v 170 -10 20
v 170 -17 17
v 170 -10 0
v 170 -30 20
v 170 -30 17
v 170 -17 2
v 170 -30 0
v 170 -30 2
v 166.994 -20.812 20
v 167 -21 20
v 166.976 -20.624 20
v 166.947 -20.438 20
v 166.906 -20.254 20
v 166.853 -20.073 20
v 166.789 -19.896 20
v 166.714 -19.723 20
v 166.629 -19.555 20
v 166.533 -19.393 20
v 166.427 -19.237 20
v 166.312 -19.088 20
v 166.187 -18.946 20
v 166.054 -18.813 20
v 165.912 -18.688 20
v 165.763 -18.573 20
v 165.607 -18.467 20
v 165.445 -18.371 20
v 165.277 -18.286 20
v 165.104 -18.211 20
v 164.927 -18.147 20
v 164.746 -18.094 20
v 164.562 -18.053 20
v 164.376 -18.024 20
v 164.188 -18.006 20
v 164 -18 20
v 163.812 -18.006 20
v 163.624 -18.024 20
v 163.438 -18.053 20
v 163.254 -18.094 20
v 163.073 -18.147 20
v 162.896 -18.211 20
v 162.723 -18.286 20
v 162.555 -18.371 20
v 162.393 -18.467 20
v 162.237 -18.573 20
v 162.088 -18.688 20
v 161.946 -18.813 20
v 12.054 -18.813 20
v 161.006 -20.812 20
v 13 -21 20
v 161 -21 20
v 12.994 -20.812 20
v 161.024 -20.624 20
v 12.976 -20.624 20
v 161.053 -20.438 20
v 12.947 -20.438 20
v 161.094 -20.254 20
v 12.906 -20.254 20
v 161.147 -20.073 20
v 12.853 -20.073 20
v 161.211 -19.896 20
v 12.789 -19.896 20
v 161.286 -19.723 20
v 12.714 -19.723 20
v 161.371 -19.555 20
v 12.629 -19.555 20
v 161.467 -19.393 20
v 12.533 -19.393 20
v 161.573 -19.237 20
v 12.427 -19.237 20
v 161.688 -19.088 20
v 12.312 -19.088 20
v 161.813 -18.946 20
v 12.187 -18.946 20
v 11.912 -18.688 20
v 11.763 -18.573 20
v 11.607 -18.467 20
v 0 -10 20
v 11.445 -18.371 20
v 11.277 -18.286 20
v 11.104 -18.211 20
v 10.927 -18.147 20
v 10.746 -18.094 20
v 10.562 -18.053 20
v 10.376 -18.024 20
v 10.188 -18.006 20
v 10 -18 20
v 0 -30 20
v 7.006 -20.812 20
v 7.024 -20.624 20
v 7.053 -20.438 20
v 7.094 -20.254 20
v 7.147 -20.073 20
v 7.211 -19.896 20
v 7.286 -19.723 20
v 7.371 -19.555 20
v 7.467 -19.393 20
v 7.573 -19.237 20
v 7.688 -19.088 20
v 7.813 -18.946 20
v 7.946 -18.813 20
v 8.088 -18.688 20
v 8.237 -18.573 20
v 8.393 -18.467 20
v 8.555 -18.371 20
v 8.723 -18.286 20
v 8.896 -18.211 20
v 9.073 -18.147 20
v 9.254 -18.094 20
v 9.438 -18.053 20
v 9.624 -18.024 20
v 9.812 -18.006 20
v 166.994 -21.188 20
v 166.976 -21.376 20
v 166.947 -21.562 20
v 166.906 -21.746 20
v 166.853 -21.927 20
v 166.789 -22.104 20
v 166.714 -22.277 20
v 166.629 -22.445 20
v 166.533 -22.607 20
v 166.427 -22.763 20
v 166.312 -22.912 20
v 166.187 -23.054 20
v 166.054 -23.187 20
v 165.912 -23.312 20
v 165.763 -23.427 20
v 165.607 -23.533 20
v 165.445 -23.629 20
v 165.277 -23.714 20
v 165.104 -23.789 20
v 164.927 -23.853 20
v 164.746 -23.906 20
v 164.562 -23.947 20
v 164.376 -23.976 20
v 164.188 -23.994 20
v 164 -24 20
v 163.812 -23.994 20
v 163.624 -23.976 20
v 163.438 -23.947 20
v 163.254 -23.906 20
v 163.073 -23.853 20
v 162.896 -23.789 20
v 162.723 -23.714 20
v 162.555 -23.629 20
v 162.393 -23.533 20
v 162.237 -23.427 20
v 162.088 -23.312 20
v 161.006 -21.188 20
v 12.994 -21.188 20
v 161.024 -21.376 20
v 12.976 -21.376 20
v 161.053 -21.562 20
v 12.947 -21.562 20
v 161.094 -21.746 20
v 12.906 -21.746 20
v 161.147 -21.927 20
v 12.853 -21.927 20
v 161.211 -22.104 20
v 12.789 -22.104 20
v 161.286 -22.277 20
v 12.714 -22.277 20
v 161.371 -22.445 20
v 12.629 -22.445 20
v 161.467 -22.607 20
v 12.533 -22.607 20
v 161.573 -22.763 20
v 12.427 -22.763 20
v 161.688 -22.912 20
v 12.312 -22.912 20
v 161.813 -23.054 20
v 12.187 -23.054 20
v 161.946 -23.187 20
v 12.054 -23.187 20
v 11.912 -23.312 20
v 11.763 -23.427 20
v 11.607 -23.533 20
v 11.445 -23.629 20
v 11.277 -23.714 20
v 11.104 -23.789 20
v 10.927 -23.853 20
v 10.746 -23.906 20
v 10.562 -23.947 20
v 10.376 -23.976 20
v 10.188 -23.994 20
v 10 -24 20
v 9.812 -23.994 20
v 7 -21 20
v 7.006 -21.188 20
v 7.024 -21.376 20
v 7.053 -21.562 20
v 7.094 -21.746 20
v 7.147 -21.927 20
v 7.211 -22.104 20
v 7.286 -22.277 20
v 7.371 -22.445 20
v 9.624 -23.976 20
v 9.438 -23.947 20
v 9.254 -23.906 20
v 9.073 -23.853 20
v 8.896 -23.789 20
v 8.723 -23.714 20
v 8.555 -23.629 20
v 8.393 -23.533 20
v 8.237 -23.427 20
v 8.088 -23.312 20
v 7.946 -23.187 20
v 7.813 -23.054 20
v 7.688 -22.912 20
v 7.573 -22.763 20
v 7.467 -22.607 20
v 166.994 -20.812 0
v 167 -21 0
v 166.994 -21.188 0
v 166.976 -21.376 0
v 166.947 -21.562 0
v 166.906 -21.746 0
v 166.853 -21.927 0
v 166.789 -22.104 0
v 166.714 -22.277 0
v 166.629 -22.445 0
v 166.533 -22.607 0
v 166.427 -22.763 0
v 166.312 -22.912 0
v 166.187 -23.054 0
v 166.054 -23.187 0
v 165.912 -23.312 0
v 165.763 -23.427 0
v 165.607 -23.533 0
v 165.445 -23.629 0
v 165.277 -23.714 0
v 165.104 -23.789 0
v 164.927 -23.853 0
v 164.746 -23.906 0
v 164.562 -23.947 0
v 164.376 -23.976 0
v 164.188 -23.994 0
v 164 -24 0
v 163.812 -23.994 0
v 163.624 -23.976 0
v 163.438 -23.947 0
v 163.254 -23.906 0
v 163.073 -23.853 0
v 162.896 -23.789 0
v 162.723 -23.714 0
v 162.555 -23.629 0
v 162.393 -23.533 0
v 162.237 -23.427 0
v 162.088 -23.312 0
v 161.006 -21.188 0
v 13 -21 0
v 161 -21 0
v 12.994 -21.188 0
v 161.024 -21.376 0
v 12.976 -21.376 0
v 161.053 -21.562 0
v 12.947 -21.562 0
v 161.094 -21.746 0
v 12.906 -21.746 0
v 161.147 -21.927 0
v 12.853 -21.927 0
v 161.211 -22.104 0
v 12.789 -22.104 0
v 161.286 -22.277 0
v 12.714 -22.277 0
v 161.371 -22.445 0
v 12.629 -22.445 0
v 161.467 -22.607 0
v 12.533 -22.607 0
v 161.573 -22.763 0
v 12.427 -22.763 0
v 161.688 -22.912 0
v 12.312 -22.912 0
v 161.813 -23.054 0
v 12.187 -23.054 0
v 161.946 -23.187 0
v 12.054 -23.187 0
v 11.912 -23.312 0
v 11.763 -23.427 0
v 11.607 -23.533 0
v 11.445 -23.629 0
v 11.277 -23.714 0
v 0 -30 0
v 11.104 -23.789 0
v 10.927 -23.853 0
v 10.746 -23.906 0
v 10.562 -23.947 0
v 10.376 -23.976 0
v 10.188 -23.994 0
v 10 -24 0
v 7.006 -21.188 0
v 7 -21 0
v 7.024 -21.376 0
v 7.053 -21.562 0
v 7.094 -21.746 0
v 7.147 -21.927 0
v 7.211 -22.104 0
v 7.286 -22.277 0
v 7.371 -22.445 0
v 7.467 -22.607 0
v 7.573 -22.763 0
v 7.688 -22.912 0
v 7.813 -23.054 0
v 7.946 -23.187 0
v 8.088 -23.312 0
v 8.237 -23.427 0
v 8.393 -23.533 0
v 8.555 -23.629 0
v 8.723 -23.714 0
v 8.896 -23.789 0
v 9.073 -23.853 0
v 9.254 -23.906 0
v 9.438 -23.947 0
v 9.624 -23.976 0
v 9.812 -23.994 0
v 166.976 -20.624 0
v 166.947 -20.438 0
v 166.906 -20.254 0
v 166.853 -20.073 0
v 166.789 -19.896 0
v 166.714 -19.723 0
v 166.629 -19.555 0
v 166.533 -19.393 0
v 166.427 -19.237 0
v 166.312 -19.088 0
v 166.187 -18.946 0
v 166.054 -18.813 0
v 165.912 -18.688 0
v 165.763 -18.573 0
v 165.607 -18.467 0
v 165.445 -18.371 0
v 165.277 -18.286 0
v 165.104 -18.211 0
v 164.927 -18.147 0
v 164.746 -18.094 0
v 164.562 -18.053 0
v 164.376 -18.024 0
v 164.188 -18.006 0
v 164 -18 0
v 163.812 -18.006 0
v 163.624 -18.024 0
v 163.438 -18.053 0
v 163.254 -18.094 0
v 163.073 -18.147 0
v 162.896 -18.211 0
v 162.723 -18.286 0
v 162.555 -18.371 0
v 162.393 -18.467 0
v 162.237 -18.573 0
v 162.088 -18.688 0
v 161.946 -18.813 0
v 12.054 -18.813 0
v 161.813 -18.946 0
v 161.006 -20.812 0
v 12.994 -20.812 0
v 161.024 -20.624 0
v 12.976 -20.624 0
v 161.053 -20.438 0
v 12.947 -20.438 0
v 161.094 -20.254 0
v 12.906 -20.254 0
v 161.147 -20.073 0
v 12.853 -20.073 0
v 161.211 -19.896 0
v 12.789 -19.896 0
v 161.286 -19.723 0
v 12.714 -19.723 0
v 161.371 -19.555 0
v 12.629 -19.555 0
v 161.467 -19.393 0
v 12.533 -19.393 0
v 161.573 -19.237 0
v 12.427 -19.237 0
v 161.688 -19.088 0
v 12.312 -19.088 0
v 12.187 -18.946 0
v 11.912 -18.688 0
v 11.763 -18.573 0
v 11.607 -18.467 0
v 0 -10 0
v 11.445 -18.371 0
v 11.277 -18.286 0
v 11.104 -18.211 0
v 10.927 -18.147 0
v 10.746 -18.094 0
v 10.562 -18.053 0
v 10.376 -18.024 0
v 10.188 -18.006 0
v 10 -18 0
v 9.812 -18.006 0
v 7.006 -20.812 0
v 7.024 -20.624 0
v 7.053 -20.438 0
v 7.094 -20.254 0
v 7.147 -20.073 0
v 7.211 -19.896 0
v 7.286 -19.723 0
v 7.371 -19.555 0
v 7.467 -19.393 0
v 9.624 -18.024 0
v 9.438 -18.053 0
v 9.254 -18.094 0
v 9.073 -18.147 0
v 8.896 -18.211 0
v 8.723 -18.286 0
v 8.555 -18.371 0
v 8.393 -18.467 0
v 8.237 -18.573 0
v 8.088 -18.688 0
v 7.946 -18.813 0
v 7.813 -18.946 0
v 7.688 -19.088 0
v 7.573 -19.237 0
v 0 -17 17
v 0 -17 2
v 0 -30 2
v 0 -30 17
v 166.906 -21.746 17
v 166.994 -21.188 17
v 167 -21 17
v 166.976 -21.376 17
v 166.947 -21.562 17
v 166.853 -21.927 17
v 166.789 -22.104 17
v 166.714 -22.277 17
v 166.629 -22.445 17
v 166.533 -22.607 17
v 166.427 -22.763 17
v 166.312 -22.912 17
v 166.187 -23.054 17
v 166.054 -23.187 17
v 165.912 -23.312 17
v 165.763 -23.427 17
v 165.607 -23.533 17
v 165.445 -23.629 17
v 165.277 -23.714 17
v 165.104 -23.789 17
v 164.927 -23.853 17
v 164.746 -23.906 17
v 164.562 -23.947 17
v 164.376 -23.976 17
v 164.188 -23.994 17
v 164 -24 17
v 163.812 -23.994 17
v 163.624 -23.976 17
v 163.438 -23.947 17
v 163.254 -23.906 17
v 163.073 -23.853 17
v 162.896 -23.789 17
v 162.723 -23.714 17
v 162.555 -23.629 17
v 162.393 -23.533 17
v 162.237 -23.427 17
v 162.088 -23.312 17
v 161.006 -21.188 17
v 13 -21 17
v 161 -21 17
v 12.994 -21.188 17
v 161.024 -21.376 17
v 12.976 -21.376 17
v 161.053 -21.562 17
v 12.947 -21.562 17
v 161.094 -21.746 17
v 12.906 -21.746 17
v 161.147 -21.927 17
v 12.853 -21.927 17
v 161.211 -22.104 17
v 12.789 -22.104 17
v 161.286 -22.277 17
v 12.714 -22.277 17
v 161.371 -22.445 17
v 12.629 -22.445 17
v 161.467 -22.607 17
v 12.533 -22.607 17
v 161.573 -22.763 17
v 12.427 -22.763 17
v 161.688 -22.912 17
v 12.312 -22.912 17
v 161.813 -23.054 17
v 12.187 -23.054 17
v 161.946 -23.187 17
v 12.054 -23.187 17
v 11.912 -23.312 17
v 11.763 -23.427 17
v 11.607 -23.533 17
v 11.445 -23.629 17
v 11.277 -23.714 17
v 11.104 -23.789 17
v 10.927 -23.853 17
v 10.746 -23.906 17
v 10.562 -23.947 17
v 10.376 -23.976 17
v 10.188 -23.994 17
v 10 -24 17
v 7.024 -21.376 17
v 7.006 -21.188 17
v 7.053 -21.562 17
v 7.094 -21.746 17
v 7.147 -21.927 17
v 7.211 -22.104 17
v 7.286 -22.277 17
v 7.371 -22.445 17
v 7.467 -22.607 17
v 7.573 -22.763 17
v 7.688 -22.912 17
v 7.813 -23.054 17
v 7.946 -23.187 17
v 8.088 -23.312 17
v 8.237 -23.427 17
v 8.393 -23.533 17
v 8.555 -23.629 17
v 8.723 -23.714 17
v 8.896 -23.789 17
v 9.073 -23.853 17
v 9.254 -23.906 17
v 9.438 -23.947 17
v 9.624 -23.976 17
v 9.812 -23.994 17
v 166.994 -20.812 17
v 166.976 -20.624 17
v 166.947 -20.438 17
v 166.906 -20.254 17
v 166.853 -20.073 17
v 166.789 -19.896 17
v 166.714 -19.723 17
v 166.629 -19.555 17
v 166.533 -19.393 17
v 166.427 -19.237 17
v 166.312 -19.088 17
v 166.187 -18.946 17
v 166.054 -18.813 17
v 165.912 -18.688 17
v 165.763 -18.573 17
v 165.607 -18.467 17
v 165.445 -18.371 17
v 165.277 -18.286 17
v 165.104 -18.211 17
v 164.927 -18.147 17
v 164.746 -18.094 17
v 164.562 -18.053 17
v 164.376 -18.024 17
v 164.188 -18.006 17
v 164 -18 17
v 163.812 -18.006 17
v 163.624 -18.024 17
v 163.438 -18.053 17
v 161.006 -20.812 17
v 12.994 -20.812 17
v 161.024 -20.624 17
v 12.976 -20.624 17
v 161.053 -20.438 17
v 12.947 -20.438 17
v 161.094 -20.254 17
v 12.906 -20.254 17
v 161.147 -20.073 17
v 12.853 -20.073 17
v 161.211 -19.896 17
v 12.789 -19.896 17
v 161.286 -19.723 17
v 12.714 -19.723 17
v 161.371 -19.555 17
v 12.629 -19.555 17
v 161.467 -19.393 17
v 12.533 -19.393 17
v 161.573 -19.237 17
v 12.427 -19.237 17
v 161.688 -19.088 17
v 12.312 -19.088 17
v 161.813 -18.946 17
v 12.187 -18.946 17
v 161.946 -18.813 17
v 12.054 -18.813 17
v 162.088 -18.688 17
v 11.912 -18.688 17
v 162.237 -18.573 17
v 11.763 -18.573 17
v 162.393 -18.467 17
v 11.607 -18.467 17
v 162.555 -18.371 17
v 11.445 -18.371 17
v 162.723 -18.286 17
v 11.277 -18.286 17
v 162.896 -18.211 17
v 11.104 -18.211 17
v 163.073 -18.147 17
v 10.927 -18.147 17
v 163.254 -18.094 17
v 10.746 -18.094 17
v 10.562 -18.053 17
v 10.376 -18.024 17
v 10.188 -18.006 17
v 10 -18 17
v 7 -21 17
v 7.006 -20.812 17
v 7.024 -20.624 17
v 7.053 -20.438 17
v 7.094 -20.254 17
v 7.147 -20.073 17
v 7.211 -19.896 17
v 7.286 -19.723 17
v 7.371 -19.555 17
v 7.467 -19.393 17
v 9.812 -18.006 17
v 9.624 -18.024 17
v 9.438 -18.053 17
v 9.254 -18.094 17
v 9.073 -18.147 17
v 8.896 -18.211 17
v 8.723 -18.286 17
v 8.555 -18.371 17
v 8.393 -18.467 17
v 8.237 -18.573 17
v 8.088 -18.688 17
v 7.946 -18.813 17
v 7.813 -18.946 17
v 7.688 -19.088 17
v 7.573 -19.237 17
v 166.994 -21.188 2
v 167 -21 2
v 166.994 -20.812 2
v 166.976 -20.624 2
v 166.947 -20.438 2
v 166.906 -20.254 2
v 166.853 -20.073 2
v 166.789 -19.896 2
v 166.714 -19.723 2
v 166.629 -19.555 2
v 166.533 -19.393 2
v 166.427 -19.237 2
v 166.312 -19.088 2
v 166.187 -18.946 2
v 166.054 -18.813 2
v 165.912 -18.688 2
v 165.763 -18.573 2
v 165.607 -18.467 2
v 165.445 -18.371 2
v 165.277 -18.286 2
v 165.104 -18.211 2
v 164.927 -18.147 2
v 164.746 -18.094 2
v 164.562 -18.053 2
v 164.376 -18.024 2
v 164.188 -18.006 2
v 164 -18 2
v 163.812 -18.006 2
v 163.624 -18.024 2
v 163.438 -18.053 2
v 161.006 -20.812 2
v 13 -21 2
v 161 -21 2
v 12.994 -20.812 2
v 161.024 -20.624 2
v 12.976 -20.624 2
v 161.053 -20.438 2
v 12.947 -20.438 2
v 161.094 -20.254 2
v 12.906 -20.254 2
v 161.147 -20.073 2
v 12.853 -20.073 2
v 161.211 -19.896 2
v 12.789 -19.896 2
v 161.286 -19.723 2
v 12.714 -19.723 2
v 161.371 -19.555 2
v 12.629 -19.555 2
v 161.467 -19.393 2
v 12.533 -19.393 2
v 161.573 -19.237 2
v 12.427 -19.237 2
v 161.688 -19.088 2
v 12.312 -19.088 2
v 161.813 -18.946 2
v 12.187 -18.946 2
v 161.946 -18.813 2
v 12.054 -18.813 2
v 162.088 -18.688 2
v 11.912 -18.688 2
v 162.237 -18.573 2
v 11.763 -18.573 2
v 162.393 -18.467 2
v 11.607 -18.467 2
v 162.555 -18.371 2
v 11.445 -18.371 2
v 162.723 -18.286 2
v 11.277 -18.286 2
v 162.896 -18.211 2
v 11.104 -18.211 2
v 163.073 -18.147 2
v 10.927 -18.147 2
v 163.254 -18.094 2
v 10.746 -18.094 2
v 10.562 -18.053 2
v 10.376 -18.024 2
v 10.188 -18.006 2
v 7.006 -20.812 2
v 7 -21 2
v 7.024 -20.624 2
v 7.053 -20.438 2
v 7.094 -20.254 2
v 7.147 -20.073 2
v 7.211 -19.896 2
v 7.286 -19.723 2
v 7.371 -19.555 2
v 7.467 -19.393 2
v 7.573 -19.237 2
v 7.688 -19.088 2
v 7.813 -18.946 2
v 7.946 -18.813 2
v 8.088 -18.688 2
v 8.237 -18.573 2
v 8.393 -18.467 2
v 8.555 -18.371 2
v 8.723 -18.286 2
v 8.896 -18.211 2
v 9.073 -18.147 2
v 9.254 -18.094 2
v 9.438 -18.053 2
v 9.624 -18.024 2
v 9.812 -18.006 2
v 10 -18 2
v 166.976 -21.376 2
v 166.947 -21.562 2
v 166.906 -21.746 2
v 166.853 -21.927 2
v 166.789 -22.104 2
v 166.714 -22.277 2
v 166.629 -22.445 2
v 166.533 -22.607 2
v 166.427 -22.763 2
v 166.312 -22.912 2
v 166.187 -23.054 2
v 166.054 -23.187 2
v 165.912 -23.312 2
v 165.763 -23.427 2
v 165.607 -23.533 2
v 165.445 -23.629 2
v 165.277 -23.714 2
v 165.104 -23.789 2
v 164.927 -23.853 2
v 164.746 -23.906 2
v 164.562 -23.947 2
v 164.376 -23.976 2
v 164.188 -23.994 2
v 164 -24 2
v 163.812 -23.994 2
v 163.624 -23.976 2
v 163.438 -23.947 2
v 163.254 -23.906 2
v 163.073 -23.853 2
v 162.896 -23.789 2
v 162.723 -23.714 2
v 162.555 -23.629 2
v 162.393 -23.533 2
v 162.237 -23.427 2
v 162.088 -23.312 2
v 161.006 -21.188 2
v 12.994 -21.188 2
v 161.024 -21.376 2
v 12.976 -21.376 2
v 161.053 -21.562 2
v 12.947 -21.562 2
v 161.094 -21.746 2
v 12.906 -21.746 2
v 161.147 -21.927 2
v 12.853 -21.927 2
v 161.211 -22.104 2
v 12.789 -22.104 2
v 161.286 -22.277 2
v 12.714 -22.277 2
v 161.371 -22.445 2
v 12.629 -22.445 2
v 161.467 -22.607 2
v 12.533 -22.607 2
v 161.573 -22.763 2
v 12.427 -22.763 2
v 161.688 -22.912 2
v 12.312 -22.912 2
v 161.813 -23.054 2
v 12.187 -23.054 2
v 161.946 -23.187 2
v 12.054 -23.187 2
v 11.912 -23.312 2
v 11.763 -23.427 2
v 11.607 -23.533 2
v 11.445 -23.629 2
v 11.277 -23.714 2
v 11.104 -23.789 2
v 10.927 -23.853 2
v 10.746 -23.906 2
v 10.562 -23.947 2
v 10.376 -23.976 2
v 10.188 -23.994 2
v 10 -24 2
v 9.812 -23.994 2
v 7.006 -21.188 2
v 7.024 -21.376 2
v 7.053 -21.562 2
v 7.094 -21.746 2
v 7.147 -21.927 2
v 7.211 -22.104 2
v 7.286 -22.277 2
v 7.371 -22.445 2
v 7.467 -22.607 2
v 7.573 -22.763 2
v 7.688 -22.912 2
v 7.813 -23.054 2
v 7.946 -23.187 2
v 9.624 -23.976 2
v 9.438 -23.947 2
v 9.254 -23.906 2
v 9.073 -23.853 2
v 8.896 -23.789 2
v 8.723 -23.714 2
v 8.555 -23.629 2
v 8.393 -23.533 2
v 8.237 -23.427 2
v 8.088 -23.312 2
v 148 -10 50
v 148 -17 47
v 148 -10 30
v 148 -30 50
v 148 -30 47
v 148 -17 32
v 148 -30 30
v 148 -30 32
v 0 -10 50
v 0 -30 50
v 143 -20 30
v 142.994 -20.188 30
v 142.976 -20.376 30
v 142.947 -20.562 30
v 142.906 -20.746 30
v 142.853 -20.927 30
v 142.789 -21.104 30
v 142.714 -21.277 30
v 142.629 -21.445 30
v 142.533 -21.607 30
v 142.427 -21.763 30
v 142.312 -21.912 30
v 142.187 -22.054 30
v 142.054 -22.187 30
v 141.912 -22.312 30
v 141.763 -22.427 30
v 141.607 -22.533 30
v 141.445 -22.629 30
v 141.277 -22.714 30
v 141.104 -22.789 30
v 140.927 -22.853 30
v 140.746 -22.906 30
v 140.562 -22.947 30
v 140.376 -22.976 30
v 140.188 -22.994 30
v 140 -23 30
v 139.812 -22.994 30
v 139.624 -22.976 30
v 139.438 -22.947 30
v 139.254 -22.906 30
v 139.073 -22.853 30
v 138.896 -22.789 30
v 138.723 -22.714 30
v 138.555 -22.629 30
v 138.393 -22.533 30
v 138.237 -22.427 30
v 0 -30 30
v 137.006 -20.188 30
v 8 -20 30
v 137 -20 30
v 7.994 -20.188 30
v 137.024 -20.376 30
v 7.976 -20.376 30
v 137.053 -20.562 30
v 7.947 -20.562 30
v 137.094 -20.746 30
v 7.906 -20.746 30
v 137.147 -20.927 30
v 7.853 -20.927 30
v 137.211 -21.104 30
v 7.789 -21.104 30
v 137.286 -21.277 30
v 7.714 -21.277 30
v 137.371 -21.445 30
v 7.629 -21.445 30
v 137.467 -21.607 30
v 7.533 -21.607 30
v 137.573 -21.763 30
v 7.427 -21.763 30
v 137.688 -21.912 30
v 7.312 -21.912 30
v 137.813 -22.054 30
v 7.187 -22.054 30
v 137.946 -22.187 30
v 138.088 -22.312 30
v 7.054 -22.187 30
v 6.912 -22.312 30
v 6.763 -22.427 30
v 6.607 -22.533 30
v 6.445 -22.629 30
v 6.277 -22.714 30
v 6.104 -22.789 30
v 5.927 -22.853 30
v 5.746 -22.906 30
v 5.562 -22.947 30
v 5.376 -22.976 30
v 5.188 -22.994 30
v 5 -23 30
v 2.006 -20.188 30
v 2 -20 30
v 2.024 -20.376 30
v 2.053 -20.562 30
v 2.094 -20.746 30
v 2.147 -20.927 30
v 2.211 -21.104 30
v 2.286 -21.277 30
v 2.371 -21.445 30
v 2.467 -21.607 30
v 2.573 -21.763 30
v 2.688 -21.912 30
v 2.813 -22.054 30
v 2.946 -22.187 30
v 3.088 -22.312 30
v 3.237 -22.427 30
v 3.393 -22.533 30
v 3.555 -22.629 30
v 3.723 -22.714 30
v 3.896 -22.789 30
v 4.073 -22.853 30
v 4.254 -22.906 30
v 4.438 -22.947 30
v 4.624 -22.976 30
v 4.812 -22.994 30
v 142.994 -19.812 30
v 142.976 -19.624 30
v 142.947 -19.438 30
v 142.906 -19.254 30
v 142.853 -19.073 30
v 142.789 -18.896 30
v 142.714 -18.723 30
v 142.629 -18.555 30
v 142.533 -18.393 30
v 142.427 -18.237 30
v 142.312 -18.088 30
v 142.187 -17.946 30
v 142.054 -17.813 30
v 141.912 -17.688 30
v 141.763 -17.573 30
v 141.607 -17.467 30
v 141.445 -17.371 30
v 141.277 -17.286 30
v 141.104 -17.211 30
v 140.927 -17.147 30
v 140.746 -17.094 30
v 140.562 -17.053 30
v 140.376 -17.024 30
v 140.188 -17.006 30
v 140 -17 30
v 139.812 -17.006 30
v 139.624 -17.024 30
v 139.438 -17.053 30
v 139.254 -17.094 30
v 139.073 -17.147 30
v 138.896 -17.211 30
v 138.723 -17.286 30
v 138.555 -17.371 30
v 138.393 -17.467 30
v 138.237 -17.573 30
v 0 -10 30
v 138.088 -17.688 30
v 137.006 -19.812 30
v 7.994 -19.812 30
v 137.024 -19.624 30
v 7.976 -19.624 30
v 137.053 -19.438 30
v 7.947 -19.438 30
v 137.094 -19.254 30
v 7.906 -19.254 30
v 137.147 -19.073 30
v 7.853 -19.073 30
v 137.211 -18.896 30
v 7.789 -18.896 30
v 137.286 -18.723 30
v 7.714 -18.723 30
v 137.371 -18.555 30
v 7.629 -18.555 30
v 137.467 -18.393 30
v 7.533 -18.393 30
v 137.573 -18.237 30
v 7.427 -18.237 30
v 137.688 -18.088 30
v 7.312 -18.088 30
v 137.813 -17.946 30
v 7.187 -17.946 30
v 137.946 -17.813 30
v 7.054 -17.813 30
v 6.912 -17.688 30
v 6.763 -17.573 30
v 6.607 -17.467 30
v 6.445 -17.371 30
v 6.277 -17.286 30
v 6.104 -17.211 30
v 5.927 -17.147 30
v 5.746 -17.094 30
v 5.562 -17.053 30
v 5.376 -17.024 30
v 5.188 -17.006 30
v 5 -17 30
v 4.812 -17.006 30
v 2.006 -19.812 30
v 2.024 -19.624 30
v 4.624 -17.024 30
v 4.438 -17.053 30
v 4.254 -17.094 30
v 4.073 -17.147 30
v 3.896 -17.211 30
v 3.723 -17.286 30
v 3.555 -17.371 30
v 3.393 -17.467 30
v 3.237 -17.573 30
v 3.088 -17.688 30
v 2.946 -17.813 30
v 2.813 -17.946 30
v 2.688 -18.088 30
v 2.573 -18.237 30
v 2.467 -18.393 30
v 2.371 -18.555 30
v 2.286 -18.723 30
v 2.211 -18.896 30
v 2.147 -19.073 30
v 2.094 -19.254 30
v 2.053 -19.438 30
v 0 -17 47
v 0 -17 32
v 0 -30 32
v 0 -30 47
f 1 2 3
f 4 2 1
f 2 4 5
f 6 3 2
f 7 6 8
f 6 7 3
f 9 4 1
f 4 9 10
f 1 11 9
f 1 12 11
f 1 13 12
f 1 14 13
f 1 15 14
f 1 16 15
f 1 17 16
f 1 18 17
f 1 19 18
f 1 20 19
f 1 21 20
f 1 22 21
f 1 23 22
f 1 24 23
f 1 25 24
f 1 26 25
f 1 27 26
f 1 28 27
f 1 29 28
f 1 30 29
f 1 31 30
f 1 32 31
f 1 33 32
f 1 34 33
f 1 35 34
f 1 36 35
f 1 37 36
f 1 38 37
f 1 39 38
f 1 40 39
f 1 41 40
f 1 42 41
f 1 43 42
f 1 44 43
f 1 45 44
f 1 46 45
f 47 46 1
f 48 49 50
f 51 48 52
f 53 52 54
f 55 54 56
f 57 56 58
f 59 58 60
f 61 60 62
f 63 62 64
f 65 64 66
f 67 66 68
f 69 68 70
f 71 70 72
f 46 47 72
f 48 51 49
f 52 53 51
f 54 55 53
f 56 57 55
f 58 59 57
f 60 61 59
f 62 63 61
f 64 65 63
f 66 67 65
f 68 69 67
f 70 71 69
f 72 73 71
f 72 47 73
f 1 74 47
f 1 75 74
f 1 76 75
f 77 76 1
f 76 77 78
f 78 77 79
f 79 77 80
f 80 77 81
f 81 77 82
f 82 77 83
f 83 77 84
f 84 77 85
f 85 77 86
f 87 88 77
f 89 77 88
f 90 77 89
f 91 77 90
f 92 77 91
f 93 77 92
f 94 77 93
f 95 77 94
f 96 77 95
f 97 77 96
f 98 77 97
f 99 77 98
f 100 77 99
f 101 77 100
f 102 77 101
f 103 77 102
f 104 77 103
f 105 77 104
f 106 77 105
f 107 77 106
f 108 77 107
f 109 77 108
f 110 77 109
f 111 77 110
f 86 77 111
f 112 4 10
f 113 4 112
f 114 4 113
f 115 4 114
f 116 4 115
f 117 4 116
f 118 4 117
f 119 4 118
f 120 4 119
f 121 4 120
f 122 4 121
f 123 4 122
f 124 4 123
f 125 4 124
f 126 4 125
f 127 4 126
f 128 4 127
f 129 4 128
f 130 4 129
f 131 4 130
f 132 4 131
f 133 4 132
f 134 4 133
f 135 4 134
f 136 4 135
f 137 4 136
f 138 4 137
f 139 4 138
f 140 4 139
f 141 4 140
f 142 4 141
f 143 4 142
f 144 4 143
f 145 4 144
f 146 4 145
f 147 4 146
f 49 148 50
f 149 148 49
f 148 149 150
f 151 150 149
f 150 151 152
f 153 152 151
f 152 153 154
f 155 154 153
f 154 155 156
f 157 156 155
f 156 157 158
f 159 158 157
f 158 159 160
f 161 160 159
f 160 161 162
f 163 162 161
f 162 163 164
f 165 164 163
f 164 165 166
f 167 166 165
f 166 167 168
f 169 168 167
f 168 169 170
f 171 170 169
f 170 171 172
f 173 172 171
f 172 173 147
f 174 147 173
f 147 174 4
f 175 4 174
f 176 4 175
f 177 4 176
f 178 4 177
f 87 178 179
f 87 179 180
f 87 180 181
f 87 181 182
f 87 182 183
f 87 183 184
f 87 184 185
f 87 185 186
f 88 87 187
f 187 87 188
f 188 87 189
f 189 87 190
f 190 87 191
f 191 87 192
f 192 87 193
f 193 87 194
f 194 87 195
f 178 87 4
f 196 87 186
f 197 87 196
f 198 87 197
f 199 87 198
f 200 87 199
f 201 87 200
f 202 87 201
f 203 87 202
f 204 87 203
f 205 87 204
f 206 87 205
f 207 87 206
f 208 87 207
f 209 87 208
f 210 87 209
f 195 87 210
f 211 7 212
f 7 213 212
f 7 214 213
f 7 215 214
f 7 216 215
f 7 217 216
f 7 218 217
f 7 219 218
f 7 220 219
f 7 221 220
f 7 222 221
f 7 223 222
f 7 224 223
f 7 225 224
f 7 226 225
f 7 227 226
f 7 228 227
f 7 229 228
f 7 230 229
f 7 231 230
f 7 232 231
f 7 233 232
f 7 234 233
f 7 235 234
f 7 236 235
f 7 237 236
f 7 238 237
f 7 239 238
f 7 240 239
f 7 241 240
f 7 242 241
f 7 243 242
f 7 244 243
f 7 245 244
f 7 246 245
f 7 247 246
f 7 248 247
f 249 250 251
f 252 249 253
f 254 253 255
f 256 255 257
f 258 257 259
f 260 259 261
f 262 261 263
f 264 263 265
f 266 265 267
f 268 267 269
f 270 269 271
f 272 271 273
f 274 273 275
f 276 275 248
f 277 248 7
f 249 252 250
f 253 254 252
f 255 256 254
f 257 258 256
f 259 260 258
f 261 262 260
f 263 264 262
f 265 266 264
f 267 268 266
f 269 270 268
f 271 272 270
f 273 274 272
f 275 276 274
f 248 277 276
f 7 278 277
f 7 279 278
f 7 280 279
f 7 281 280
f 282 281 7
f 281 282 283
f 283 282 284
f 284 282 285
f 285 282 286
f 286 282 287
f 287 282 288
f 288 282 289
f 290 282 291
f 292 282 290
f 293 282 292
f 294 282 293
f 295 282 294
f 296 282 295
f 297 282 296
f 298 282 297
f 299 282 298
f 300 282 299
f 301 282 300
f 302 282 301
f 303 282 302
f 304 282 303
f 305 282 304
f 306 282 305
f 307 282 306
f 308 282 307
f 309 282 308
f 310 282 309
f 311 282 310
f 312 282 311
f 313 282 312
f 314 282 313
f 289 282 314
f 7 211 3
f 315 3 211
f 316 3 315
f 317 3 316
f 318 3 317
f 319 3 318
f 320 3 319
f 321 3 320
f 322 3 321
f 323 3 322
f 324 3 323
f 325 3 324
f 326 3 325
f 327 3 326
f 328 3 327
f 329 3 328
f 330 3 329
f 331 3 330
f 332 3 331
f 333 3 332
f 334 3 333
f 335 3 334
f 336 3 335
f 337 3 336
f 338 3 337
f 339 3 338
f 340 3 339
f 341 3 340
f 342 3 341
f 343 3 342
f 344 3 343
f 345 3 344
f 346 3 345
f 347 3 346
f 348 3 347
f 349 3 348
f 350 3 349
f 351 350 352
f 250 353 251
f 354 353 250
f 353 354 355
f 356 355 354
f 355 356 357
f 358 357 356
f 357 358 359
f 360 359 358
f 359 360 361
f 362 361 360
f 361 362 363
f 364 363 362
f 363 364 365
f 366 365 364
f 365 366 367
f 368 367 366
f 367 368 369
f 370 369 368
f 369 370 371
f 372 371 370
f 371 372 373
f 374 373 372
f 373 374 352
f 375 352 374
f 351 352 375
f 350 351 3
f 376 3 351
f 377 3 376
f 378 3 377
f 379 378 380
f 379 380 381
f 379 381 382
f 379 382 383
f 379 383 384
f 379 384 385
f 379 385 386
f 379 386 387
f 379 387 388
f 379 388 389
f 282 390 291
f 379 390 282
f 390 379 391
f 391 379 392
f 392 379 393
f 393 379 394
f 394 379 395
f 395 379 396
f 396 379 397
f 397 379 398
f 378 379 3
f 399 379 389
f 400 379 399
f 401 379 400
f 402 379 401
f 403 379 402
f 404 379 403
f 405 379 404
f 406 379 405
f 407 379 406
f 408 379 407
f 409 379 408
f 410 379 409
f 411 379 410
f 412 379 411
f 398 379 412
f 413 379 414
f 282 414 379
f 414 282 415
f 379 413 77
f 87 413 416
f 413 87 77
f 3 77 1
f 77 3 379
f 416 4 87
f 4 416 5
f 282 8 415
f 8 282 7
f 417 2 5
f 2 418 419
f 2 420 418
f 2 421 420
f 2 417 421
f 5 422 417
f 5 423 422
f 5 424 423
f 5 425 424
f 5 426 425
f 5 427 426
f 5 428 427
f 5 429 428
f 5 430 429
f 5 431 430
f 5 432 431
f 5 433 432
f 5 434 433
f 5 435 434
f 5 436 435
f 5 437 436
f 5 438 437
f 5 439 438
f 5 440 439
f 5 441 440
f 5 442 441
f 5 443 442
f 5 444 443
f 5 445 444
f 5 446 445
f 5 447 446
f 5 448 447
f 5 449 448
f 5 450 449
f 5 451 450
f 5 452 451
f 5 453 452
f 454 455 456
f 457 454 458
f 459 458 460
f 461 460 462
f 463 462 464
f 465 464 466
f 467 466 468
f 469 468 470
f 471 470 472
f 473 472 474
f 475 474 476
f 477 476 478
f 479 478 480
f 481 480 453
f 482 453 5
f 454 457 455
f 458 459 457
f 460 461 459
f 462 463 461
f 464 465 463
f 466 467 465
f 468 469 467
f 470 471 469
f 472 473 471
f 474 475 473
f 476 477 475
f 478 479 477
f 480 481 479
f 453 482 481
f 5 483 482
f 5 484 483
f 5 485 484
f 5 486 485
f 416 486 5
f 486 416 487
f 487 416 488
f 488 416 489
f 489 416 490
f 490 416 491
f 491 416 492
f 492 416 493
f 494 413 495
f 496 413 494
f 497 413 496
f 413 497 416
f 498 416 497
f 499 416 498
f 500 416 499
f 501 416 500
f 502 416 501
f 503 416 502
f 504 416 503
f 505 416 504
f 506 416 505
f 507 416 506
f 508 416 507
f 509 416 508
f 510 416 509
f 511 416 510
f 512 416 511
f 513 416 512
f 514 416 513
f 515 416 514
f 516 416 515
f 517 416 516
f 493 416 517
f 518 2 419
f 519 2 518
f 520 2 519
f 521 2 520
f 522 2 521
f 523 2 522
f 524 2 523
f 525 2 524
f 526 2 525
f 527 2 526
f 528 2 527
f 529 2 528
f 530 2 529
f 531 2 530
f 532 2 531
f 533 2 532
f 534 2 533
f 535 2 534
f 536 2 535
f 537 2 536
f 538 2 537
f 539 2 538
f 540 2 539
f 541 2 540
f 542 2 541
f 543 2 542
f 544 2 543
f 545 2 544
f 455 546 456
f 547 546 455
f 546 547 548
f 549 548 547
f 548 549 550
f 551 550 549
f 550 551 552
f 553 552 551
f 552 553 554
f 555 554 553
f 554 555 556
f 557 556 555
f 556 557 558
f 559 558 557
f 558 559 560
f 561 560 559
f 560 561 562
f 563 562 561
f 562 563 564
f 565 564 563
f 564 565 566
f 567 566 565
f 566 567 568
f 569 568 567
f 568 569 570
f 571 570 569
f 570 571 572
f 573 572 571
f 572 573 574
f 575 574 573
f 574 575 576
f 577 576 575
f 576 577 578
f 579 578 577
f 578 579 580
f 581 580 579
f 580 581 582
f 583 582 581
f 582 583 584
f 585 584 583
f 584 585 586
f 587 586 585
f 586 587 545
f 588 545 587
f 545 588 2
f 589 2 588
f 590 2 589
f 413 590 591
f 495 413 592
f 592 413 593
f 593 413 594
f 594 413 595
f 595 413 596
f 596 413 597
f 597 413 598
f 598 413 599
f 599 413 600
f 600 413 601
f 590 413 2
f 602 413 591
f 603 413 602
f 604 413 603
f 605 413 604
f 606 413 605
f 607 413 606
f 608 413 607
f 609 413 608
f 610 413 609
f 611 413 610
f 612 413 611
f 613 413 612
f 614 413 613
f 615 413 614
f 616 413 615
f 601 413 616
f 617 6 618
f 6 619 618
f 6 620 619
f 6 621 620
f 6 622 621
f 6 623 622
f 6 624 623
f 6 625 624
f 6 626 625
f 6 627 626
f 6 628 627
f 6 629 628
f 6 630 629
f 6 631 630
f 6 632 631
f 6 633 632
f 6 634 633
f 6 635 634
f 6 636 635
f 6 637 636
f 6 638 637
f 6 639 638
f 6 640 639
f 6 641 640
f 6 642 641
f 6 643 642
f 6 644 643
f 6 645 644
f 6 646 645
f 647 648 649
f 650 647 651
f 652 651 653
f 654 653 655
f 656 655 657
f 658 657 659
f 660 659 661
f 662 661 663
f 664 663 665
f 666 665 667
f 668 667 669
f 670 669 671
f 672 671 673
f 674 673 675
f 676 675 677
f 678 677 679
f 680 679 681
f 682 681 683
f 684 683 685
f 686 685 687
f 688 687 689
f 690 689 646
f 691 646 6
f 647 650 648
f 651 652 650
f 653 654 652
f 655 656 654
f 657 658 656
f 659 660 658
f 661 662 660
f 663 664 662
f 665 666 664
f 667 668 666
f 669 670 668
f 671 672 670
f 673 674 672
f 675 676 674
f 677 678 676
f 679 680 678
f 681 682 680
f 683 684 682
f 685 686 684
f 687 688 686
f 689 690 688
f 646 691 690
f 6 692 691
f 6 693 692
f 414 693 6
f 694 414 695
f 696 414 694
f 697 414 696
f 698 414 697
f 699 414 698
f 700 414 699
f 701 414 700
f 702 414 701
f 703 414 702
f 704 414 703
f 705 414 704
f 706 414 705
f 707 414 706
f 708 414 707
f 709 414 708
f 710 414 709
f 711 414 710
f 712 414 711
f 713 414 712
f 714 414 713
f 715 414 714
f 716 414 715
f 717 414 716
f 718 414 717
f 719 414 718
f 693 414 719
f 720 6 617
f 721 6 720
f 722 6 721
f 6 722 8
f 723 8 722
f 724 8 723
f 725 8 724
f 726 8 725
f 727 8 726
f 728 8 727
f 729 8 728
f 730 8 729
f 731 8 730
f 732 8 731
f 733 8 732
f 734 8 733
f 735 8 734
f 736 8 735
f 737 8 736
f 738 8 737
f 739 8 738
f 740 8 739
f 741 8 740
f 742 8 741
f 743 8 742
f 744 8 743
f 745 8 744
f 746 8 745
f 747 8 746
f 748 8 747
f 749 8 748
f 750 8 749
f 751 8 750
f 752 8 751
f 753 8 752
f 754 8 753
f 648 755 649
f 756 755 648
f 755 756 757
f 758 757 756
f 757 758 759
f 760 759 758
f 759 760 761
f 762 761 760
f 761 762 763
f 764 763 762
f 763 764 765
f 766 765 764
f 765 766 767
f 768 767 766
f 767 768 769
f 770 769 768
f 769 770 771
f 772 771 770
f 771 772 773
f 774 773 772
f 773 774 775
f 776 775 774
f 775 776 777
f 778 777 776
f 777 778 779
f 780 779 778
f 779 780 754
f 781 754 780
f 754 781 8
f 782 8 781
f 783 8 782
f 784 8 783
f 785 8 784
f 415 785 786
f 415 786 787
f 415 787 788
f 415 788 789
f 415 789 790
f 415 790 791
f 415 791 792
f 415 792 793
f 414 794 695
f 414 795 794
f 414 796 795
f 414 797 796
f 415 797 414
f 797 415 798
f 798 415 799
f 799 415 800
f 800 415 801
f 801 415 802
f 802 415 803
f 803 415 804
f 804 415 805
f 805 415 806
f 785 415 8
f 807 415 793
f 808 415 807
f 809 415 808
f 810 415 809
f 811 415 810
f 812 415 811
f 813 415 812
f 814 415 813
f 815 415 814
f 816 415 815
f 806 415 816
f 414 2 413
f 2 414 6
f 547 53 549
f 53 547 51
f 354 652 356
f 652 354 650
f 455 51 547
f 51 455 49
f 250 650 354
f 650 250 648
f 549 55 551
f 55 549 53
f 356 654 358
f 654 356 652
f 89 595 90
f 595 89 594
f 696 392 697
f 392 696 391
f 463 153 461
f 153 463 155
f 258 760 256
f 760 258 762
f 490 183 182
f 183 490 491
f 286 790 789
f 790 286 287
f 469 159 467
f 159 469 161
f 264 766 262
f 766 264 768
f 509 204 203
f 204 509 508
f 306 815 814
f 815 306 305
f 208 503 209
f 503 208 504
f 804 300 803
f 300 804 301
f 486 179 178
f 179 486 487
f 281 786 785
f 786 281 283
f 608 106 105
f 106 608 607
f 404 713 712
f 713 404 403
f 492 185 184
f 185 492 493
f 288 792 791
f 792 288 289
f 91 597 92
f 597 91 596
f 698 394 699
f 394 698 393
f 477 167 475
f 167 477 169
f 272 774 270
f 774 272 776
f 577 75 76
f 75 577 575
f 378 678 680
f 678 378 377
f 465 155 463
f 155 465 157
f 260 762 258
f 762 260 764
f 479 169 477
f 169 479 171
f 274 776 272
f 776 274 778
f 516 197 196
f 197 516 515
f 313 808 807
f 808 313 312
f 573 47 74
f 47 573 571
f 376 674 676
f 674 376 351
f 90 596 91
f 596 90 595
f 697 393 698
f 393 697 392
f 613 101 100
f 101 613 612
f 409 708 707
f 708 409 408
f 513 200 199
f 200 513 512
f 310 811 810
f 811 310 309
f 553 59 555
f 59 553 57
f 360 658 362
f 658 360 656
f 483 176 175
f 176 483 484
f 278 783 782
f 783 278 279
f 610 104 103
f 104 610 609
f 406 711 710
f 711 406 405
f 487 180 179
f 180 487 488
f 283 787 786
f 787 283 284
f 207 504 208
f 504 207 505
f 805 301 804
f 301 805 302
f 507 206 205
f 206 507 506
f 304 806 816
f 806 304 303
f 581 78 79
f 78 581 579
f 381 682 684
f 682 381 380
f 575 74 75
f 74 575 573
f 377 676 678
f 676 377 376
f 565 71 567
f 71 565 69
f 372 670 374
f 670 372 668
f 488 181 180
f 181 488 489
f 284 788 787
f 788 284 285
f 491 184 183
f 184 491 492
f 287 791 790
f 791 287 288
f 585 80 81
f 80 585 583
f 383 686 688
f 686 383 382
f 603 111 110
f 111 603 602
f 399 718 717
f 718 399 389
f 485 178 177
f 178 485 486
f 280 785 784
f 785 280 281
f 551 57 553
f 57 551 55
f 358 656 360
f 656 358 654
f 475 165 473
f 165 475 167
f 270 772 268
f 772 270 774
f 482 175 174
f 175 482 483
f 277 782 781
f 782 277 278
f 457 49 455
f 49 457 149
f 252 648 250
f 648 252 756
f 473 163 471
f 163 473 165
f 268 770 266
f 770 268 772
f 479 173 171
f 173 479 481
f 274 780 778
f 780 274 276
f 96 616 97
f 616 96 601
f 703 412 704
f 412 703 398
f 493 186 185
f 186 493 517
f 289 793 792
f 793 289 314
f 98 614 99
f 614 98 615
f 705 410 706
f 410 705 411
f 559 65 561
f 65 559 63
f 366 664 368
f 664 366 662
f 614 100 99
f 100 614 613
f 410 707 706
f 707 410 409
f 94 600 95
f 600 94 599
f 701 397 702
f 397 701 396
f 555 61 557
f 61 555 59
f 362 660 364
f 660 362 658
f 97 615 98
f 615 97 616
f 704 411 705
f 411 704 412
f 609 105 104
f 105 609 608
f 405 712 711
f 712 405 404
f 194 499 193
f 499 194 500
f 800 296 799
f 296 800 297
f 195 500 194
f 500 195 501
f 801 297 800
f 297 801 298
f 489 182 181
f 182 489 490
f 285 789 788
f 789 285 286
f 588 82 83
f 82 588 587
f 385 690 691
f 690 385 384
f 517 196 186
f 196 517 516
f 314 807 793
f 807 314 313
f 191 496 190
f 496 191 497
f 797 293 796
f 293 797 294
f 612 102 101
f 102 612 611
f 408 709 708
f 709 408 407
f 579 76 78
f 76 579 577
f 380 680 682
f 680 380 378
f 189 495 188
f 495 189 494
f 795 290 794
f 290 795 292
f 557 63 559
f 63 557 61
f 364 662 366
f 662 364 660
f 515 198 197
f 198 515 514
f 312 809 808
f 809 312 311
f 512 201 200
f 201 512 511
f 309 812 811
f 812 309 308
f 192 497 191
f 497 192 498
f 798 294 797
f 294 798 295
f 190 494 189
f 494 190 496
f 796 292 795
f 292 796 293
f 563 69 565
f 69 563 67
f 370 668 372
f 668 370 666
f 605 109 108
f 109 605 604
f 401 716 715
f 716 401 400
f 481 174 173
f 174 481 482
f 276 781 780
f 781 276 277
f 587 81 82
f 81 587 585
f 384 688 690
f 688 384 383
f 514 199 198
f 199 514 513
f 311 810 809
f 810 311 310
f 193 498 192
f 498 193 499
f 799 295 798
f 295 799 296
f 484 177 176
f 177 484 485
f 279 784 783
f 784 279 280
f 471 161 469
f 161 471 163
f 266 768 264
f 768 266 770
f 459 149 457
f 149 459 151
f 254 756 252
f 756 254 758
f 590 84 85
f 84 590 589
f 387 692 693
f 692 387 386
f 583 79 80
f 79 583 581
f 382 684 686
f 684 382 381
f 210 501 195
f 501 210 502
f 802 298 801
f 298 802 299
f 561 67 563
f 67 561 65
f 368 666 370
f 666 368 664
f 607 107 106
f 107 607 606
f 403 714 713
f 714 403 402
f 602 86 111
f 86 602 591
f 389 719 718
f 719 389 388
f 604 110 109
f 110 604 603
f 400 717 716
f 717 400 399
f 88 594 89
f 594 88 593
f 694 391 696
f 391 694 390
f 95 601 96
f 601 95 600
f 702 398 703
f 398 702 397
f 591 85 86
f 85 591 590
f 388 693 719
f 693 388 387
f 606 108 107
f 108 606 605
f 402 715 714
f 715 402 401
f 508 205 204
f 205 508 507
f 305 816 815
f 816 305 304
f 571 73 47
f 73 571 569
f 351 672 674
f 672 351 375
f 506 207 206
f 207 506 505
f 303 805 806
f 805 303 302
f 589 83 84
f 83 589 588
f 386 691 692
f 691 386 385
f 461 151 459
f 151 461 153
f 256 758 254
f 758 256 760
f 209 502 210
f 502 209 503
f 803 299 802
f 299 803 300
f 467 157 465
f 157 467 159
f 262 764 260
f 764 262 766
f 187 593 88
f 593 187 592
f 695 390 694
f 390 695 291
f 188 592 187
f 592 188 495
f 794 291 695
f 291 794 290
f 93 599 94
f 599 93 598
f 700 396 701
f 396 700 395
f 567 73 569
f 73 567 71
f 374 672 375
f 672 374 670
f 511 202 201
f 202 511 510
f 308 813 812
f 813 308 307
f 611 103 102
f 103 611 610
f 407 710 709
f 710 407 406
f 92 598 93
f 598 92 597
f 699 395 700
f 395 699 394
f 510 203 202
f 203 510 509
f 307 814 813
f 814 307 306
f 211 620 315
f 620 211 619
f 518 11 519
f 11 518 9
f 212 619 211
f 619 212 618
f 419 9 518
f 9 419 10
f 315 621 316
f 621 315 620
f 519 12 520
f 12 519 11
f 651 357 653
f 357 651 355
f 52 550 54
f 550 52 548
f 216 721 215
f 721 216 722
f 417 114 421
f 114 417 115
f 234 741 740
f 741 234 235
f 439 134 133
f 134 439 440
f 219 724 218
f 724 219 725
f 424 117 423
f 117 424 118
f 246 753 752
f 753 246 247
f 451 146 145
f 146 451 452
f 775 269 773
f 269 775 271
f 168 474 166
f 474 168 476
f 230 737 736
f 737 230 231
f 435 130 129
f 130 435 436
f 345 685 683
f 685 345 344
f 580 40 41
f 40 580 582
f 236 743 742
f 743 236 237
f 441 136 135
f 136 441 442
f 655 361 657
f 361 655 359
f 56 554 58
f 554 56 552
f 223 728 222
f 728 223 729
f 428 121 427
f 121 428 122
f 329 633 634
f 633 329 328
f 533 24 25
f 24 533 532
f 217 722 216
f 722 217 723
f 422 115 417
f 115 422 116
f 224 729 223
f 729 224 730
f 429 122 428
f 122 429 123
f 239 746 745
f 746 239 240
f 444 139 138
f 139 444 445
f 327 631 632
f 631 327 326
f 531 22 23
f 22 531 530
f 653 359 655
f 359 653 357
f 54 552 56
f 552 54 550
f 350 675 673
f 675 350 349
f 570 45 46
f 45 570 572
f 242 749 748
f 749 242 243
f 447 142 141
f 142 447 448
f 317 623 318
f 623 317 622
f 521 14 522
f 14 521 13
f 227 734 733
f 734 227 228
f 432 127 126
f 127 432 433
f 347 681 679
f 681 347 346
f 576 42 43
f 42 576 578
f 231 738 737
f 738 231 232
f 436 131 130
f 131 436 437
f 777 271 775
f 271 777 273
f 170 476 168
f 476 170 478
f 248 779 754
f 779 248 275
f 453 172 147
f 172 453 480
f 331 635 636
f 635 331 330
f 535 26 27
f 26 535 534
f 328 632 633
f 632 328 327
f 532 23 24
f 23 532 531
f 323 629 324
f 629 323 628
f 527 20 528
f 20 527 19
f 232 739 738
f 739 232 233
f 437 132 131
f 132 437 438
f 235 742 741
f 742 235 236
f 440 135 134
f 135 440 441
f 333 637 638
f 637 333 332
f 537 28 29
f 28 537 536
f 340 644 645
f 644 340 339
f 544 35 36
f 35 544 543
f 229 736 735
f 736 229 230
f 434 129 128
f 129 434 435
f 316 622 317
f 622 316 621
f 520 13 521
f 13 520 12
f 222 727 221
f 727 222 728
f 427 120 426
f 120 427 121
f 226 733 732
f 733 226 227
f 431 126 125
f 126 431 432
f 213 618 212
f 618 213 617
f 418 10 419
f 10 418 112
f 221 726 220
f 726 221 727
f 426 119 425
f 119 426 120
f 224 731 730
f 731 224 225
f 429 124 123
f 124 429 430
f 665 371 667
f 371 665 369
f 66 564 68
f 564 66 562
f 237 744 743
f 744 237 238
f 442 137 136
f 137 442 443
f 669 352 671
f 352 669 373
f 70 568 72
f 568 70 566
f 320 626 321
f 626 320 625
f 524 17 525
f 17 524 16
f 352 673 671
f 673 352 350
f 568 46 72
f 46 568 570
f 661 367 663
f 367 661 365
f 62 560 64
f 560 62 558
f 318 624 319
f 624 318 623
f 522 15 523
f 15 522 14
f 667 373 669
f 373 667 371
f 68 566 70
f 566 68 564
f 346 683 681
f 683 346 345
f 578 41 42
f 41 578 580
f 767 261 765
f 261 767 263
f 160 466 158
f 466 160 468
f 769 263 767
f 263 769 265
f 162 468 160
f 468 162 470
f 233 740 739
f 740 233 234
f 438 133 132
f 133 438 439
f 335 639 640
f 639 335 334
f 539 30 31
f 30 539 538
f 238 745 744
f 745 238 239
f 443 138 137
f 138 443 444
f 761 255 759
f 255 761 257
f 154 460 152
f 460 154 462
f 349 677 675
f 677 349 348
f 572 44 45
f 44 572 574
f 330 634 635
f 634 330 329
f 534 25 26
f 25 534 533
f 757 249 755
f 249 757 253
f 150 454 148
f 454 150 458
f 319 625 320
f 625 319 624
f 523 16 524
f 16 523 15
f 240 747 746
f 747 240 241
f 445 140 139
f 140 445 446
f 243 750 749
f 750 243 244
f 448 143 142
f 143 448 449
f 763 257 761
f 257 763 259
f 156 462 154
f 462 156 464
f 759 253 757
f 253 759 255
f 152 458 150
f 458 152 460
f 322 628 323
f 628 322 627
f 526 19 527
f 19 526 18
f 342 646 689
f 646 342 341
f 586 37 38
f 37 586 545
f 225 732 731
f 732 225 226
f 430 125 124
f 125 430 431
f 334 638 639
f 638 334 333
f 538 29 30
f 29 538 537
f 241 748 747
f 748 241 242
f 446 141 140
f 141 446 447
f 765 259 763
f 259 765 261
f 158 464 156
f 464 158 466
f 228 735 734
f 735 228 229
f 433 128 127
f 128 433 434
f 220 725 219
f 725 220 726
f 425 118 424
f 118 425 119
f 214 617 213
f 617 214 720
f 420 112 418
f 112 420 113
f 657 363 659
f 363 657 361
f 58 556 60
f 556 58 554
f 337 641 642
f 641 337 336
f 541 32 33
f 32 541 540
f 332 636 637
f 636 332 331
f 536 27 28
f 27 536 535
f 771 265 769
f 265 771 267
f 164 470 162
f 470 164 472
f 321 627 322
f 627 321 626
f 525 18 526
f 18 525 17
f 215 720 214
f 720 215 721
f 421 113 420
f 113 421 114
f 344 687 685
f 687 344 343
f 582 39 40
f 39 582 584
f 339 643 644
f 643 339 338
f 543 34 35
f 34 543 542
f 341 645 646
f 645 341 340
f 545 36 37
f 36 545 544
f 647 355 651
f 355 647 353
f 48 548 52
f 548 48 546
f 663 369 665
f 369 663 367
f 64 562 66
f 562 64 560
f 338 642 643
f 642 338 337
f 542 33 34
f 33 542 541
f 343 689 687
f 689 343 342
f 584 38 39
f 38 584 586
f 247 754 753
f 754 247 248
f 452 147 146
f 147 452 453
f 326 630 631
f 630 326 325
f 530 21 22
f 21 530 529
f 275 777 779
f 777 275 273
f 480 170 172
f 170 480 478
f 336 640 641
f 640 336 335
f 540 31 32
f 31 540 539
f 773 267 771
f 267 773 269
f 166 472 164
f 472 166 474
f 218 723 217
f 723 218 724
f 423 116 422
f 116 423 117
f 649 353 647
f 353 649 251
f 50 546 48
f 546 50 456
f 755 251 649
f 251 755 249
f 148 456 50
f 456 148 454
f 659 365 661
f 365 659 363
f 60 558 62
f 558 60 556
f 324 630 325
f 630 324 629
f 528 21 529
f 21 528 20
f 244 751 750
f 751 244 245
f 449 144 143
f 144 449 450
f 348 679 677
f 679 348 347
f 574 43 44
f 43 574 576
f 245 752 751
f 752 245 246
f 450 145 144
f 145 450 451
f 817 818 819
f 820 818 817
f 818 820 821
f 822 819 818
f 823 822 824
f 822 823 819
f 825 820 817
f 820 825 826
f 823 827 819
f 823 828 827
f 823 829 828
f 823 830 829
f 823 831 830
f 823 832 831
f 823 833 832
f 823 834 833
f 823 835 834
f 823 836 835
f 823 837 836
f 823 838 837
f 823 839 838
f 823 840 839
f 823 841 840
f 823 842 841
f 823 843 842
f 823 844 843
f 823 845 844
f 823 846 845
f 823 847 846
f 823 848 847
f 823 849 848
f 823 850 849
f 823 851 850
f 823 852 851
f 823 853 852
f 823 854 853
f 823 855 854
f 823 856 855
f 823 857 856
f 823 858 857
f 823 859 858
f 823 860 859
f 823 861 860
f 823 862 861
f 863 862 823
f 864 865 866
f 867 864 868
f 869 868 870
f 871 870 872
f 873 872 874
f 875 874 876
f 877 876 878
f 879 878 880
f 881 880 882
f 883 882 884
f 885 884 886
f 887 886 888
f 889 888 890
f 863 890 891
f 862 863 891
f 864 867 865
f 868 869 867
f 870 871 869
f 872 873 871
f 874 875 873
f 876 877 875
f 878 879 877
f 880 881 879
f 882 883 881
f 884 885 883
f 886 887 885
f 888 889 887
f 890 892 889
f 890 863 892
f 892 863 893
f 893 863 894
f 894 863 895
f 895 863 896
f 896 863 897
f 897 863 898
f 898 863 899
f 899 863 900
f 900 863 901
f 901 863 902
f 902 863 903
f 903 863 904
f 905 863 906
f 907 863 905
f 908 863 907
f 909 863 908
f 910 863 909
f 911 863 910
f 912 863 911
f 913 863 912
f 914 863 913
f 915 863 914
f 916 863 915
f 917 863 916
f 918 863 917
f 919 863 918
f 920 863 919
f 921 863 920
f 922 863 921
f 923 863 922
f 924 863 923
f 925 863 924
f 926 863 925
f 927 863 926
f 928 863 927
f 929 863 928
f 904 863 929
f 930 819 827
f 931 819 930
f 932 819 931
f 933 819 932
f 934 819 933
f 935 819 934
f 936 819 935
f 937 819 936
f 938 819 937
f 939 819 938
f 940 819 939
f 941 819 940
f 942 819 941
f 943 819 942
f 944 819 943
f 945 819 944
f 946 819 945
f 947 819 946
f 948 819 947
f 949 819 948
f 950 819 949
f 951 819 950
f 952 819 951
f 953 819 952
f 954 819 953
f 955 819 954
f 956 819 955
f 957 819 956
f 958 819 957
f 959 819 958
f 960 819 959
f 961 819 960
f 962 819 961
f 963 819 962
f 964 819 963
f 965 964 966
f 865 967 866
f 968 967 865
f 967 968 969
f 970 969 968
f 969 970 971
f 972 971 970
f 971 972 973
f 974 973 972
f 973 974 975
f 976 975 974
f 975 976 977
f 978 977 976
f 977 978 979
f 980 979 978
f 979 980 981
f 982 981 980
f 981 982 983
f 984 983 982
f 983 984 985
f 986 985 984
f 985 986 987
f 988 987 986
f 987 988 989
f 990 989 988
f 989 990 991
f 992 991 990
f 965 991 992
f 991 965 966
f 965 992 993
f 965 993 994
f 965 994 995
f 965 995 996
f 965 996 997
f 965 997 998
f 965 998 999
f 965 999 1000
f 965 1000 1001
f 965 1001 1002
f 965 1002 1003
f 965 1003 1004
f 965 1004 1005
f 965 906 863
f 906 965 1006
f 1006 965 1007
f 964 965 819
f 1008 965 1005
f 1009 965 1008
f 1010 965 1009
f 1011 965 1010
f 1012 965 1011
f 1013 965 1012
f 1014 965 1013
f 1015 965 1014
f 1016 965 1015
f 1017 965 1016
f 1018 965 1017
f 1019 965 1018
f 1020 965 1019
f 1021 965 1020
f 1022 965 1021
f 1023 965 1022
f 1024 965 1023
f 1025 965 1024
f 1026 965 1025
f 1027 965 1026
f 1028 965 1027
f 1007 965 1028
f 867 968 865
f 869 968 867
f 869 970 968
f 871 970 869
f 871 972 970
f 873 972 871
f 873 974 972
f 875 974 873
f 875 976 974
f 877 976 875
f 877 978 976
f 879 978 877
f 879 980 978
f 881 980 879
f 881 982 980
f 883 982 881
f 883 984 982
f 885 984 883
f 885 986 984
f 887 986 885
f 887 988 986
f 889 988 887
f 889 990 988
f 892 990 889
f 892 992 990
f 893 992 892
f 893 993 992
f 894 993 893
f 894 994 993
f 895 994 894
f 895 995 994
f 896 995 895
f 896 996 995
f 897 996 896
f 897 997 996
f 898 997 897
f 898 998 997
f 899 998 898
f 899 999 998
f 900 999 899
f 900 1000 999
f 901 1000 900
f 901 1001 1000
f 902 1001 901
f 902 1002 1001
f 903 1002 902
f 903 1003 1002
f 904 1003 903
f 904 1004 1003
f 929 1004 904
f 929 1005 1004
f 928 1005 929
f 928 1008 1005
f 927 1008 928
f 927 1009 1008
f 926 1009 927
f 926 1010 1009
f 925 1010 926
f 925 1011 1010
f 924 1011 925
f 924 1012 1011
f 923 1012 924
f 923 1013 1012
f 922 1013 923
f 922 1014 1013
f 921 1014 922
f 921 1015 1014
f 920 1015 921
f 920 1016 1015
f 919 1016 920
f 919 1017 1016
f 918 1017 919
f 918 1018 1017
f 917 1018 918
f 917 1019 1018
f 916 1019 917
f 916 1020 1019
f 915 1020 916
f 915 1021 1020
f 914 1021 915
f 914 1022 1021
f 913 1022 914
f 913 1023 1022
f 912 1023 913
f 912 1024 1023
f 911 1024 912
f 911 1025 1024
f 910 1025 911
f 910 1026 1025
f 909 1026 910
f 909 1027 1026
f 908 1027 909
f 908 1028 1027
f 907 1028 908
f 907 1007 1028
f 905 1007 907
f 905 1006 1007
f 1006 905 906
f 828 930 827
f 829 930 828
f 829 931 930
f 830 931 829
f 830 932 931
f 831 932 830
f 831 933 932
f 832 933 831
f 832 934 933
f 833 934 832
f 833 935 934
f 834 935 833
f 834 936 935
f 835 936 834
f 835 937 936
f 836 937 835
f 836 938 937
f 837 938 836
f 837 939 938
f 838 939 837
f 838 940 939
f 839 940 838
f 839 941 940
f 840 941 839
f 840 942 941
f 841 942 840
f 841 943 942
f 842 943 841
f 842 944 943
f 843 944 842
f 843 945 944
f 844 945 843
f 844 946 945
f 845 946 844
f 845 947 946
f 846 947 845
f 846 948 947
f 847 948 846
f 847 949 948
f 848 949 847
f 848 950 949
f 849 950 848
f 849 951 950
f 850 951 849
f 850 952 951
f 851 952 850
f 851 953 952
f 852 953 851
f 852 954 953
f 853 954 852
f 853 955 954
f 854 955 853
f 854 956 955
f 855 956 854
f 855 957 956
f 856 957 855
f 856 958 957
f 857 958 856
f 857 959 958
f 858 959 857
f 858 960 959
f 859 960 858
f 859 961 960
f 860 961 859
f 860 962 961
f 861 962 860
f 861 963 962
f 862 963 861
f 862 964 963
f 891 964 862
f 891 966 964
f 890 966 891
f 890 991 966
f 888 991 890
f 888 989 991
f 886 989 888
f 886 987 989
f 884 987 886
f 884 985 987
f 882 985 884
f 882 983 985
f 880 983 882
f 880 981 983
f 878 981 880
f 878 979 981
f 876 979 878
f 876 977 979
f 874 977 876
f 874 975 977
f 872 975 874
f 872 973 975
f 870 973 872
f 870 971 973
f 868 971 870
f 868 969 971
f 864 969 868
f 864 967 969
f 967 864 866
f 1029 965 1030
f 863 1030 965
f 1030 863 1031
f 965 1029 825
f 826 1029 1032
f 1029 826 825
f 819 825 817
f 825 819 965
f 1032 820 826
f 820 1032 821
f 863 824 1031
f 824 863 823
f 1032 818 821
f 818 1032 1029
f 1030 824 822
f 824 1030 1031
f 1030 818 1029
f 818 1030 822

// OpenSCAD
translate([0,-30,0])difference(){
difference(){
difference(){
union(){
cube([170,20,20]);



}
translate([0,0,2])cube([340,13,15]);
}
translate([10, 9,-10]) cylinder(40,3,3, $fn=100);}
translate([164, 9,-10]) cylinder(40,3,3, $fn=100);}

difference(){


difference(){
rotate([0,0,360])translate([0,-30,30])cube([148,20,20]);
rotate([0,0,360])translate([0,-30,30])translate([0,0,2])cube([340,13,15]);
}
translate([5, -20,-10]) cylinder(40,3,3, $fn=100);
translate([140, -20,-10]) cylinder(40,3,3, $fn=100);
}
